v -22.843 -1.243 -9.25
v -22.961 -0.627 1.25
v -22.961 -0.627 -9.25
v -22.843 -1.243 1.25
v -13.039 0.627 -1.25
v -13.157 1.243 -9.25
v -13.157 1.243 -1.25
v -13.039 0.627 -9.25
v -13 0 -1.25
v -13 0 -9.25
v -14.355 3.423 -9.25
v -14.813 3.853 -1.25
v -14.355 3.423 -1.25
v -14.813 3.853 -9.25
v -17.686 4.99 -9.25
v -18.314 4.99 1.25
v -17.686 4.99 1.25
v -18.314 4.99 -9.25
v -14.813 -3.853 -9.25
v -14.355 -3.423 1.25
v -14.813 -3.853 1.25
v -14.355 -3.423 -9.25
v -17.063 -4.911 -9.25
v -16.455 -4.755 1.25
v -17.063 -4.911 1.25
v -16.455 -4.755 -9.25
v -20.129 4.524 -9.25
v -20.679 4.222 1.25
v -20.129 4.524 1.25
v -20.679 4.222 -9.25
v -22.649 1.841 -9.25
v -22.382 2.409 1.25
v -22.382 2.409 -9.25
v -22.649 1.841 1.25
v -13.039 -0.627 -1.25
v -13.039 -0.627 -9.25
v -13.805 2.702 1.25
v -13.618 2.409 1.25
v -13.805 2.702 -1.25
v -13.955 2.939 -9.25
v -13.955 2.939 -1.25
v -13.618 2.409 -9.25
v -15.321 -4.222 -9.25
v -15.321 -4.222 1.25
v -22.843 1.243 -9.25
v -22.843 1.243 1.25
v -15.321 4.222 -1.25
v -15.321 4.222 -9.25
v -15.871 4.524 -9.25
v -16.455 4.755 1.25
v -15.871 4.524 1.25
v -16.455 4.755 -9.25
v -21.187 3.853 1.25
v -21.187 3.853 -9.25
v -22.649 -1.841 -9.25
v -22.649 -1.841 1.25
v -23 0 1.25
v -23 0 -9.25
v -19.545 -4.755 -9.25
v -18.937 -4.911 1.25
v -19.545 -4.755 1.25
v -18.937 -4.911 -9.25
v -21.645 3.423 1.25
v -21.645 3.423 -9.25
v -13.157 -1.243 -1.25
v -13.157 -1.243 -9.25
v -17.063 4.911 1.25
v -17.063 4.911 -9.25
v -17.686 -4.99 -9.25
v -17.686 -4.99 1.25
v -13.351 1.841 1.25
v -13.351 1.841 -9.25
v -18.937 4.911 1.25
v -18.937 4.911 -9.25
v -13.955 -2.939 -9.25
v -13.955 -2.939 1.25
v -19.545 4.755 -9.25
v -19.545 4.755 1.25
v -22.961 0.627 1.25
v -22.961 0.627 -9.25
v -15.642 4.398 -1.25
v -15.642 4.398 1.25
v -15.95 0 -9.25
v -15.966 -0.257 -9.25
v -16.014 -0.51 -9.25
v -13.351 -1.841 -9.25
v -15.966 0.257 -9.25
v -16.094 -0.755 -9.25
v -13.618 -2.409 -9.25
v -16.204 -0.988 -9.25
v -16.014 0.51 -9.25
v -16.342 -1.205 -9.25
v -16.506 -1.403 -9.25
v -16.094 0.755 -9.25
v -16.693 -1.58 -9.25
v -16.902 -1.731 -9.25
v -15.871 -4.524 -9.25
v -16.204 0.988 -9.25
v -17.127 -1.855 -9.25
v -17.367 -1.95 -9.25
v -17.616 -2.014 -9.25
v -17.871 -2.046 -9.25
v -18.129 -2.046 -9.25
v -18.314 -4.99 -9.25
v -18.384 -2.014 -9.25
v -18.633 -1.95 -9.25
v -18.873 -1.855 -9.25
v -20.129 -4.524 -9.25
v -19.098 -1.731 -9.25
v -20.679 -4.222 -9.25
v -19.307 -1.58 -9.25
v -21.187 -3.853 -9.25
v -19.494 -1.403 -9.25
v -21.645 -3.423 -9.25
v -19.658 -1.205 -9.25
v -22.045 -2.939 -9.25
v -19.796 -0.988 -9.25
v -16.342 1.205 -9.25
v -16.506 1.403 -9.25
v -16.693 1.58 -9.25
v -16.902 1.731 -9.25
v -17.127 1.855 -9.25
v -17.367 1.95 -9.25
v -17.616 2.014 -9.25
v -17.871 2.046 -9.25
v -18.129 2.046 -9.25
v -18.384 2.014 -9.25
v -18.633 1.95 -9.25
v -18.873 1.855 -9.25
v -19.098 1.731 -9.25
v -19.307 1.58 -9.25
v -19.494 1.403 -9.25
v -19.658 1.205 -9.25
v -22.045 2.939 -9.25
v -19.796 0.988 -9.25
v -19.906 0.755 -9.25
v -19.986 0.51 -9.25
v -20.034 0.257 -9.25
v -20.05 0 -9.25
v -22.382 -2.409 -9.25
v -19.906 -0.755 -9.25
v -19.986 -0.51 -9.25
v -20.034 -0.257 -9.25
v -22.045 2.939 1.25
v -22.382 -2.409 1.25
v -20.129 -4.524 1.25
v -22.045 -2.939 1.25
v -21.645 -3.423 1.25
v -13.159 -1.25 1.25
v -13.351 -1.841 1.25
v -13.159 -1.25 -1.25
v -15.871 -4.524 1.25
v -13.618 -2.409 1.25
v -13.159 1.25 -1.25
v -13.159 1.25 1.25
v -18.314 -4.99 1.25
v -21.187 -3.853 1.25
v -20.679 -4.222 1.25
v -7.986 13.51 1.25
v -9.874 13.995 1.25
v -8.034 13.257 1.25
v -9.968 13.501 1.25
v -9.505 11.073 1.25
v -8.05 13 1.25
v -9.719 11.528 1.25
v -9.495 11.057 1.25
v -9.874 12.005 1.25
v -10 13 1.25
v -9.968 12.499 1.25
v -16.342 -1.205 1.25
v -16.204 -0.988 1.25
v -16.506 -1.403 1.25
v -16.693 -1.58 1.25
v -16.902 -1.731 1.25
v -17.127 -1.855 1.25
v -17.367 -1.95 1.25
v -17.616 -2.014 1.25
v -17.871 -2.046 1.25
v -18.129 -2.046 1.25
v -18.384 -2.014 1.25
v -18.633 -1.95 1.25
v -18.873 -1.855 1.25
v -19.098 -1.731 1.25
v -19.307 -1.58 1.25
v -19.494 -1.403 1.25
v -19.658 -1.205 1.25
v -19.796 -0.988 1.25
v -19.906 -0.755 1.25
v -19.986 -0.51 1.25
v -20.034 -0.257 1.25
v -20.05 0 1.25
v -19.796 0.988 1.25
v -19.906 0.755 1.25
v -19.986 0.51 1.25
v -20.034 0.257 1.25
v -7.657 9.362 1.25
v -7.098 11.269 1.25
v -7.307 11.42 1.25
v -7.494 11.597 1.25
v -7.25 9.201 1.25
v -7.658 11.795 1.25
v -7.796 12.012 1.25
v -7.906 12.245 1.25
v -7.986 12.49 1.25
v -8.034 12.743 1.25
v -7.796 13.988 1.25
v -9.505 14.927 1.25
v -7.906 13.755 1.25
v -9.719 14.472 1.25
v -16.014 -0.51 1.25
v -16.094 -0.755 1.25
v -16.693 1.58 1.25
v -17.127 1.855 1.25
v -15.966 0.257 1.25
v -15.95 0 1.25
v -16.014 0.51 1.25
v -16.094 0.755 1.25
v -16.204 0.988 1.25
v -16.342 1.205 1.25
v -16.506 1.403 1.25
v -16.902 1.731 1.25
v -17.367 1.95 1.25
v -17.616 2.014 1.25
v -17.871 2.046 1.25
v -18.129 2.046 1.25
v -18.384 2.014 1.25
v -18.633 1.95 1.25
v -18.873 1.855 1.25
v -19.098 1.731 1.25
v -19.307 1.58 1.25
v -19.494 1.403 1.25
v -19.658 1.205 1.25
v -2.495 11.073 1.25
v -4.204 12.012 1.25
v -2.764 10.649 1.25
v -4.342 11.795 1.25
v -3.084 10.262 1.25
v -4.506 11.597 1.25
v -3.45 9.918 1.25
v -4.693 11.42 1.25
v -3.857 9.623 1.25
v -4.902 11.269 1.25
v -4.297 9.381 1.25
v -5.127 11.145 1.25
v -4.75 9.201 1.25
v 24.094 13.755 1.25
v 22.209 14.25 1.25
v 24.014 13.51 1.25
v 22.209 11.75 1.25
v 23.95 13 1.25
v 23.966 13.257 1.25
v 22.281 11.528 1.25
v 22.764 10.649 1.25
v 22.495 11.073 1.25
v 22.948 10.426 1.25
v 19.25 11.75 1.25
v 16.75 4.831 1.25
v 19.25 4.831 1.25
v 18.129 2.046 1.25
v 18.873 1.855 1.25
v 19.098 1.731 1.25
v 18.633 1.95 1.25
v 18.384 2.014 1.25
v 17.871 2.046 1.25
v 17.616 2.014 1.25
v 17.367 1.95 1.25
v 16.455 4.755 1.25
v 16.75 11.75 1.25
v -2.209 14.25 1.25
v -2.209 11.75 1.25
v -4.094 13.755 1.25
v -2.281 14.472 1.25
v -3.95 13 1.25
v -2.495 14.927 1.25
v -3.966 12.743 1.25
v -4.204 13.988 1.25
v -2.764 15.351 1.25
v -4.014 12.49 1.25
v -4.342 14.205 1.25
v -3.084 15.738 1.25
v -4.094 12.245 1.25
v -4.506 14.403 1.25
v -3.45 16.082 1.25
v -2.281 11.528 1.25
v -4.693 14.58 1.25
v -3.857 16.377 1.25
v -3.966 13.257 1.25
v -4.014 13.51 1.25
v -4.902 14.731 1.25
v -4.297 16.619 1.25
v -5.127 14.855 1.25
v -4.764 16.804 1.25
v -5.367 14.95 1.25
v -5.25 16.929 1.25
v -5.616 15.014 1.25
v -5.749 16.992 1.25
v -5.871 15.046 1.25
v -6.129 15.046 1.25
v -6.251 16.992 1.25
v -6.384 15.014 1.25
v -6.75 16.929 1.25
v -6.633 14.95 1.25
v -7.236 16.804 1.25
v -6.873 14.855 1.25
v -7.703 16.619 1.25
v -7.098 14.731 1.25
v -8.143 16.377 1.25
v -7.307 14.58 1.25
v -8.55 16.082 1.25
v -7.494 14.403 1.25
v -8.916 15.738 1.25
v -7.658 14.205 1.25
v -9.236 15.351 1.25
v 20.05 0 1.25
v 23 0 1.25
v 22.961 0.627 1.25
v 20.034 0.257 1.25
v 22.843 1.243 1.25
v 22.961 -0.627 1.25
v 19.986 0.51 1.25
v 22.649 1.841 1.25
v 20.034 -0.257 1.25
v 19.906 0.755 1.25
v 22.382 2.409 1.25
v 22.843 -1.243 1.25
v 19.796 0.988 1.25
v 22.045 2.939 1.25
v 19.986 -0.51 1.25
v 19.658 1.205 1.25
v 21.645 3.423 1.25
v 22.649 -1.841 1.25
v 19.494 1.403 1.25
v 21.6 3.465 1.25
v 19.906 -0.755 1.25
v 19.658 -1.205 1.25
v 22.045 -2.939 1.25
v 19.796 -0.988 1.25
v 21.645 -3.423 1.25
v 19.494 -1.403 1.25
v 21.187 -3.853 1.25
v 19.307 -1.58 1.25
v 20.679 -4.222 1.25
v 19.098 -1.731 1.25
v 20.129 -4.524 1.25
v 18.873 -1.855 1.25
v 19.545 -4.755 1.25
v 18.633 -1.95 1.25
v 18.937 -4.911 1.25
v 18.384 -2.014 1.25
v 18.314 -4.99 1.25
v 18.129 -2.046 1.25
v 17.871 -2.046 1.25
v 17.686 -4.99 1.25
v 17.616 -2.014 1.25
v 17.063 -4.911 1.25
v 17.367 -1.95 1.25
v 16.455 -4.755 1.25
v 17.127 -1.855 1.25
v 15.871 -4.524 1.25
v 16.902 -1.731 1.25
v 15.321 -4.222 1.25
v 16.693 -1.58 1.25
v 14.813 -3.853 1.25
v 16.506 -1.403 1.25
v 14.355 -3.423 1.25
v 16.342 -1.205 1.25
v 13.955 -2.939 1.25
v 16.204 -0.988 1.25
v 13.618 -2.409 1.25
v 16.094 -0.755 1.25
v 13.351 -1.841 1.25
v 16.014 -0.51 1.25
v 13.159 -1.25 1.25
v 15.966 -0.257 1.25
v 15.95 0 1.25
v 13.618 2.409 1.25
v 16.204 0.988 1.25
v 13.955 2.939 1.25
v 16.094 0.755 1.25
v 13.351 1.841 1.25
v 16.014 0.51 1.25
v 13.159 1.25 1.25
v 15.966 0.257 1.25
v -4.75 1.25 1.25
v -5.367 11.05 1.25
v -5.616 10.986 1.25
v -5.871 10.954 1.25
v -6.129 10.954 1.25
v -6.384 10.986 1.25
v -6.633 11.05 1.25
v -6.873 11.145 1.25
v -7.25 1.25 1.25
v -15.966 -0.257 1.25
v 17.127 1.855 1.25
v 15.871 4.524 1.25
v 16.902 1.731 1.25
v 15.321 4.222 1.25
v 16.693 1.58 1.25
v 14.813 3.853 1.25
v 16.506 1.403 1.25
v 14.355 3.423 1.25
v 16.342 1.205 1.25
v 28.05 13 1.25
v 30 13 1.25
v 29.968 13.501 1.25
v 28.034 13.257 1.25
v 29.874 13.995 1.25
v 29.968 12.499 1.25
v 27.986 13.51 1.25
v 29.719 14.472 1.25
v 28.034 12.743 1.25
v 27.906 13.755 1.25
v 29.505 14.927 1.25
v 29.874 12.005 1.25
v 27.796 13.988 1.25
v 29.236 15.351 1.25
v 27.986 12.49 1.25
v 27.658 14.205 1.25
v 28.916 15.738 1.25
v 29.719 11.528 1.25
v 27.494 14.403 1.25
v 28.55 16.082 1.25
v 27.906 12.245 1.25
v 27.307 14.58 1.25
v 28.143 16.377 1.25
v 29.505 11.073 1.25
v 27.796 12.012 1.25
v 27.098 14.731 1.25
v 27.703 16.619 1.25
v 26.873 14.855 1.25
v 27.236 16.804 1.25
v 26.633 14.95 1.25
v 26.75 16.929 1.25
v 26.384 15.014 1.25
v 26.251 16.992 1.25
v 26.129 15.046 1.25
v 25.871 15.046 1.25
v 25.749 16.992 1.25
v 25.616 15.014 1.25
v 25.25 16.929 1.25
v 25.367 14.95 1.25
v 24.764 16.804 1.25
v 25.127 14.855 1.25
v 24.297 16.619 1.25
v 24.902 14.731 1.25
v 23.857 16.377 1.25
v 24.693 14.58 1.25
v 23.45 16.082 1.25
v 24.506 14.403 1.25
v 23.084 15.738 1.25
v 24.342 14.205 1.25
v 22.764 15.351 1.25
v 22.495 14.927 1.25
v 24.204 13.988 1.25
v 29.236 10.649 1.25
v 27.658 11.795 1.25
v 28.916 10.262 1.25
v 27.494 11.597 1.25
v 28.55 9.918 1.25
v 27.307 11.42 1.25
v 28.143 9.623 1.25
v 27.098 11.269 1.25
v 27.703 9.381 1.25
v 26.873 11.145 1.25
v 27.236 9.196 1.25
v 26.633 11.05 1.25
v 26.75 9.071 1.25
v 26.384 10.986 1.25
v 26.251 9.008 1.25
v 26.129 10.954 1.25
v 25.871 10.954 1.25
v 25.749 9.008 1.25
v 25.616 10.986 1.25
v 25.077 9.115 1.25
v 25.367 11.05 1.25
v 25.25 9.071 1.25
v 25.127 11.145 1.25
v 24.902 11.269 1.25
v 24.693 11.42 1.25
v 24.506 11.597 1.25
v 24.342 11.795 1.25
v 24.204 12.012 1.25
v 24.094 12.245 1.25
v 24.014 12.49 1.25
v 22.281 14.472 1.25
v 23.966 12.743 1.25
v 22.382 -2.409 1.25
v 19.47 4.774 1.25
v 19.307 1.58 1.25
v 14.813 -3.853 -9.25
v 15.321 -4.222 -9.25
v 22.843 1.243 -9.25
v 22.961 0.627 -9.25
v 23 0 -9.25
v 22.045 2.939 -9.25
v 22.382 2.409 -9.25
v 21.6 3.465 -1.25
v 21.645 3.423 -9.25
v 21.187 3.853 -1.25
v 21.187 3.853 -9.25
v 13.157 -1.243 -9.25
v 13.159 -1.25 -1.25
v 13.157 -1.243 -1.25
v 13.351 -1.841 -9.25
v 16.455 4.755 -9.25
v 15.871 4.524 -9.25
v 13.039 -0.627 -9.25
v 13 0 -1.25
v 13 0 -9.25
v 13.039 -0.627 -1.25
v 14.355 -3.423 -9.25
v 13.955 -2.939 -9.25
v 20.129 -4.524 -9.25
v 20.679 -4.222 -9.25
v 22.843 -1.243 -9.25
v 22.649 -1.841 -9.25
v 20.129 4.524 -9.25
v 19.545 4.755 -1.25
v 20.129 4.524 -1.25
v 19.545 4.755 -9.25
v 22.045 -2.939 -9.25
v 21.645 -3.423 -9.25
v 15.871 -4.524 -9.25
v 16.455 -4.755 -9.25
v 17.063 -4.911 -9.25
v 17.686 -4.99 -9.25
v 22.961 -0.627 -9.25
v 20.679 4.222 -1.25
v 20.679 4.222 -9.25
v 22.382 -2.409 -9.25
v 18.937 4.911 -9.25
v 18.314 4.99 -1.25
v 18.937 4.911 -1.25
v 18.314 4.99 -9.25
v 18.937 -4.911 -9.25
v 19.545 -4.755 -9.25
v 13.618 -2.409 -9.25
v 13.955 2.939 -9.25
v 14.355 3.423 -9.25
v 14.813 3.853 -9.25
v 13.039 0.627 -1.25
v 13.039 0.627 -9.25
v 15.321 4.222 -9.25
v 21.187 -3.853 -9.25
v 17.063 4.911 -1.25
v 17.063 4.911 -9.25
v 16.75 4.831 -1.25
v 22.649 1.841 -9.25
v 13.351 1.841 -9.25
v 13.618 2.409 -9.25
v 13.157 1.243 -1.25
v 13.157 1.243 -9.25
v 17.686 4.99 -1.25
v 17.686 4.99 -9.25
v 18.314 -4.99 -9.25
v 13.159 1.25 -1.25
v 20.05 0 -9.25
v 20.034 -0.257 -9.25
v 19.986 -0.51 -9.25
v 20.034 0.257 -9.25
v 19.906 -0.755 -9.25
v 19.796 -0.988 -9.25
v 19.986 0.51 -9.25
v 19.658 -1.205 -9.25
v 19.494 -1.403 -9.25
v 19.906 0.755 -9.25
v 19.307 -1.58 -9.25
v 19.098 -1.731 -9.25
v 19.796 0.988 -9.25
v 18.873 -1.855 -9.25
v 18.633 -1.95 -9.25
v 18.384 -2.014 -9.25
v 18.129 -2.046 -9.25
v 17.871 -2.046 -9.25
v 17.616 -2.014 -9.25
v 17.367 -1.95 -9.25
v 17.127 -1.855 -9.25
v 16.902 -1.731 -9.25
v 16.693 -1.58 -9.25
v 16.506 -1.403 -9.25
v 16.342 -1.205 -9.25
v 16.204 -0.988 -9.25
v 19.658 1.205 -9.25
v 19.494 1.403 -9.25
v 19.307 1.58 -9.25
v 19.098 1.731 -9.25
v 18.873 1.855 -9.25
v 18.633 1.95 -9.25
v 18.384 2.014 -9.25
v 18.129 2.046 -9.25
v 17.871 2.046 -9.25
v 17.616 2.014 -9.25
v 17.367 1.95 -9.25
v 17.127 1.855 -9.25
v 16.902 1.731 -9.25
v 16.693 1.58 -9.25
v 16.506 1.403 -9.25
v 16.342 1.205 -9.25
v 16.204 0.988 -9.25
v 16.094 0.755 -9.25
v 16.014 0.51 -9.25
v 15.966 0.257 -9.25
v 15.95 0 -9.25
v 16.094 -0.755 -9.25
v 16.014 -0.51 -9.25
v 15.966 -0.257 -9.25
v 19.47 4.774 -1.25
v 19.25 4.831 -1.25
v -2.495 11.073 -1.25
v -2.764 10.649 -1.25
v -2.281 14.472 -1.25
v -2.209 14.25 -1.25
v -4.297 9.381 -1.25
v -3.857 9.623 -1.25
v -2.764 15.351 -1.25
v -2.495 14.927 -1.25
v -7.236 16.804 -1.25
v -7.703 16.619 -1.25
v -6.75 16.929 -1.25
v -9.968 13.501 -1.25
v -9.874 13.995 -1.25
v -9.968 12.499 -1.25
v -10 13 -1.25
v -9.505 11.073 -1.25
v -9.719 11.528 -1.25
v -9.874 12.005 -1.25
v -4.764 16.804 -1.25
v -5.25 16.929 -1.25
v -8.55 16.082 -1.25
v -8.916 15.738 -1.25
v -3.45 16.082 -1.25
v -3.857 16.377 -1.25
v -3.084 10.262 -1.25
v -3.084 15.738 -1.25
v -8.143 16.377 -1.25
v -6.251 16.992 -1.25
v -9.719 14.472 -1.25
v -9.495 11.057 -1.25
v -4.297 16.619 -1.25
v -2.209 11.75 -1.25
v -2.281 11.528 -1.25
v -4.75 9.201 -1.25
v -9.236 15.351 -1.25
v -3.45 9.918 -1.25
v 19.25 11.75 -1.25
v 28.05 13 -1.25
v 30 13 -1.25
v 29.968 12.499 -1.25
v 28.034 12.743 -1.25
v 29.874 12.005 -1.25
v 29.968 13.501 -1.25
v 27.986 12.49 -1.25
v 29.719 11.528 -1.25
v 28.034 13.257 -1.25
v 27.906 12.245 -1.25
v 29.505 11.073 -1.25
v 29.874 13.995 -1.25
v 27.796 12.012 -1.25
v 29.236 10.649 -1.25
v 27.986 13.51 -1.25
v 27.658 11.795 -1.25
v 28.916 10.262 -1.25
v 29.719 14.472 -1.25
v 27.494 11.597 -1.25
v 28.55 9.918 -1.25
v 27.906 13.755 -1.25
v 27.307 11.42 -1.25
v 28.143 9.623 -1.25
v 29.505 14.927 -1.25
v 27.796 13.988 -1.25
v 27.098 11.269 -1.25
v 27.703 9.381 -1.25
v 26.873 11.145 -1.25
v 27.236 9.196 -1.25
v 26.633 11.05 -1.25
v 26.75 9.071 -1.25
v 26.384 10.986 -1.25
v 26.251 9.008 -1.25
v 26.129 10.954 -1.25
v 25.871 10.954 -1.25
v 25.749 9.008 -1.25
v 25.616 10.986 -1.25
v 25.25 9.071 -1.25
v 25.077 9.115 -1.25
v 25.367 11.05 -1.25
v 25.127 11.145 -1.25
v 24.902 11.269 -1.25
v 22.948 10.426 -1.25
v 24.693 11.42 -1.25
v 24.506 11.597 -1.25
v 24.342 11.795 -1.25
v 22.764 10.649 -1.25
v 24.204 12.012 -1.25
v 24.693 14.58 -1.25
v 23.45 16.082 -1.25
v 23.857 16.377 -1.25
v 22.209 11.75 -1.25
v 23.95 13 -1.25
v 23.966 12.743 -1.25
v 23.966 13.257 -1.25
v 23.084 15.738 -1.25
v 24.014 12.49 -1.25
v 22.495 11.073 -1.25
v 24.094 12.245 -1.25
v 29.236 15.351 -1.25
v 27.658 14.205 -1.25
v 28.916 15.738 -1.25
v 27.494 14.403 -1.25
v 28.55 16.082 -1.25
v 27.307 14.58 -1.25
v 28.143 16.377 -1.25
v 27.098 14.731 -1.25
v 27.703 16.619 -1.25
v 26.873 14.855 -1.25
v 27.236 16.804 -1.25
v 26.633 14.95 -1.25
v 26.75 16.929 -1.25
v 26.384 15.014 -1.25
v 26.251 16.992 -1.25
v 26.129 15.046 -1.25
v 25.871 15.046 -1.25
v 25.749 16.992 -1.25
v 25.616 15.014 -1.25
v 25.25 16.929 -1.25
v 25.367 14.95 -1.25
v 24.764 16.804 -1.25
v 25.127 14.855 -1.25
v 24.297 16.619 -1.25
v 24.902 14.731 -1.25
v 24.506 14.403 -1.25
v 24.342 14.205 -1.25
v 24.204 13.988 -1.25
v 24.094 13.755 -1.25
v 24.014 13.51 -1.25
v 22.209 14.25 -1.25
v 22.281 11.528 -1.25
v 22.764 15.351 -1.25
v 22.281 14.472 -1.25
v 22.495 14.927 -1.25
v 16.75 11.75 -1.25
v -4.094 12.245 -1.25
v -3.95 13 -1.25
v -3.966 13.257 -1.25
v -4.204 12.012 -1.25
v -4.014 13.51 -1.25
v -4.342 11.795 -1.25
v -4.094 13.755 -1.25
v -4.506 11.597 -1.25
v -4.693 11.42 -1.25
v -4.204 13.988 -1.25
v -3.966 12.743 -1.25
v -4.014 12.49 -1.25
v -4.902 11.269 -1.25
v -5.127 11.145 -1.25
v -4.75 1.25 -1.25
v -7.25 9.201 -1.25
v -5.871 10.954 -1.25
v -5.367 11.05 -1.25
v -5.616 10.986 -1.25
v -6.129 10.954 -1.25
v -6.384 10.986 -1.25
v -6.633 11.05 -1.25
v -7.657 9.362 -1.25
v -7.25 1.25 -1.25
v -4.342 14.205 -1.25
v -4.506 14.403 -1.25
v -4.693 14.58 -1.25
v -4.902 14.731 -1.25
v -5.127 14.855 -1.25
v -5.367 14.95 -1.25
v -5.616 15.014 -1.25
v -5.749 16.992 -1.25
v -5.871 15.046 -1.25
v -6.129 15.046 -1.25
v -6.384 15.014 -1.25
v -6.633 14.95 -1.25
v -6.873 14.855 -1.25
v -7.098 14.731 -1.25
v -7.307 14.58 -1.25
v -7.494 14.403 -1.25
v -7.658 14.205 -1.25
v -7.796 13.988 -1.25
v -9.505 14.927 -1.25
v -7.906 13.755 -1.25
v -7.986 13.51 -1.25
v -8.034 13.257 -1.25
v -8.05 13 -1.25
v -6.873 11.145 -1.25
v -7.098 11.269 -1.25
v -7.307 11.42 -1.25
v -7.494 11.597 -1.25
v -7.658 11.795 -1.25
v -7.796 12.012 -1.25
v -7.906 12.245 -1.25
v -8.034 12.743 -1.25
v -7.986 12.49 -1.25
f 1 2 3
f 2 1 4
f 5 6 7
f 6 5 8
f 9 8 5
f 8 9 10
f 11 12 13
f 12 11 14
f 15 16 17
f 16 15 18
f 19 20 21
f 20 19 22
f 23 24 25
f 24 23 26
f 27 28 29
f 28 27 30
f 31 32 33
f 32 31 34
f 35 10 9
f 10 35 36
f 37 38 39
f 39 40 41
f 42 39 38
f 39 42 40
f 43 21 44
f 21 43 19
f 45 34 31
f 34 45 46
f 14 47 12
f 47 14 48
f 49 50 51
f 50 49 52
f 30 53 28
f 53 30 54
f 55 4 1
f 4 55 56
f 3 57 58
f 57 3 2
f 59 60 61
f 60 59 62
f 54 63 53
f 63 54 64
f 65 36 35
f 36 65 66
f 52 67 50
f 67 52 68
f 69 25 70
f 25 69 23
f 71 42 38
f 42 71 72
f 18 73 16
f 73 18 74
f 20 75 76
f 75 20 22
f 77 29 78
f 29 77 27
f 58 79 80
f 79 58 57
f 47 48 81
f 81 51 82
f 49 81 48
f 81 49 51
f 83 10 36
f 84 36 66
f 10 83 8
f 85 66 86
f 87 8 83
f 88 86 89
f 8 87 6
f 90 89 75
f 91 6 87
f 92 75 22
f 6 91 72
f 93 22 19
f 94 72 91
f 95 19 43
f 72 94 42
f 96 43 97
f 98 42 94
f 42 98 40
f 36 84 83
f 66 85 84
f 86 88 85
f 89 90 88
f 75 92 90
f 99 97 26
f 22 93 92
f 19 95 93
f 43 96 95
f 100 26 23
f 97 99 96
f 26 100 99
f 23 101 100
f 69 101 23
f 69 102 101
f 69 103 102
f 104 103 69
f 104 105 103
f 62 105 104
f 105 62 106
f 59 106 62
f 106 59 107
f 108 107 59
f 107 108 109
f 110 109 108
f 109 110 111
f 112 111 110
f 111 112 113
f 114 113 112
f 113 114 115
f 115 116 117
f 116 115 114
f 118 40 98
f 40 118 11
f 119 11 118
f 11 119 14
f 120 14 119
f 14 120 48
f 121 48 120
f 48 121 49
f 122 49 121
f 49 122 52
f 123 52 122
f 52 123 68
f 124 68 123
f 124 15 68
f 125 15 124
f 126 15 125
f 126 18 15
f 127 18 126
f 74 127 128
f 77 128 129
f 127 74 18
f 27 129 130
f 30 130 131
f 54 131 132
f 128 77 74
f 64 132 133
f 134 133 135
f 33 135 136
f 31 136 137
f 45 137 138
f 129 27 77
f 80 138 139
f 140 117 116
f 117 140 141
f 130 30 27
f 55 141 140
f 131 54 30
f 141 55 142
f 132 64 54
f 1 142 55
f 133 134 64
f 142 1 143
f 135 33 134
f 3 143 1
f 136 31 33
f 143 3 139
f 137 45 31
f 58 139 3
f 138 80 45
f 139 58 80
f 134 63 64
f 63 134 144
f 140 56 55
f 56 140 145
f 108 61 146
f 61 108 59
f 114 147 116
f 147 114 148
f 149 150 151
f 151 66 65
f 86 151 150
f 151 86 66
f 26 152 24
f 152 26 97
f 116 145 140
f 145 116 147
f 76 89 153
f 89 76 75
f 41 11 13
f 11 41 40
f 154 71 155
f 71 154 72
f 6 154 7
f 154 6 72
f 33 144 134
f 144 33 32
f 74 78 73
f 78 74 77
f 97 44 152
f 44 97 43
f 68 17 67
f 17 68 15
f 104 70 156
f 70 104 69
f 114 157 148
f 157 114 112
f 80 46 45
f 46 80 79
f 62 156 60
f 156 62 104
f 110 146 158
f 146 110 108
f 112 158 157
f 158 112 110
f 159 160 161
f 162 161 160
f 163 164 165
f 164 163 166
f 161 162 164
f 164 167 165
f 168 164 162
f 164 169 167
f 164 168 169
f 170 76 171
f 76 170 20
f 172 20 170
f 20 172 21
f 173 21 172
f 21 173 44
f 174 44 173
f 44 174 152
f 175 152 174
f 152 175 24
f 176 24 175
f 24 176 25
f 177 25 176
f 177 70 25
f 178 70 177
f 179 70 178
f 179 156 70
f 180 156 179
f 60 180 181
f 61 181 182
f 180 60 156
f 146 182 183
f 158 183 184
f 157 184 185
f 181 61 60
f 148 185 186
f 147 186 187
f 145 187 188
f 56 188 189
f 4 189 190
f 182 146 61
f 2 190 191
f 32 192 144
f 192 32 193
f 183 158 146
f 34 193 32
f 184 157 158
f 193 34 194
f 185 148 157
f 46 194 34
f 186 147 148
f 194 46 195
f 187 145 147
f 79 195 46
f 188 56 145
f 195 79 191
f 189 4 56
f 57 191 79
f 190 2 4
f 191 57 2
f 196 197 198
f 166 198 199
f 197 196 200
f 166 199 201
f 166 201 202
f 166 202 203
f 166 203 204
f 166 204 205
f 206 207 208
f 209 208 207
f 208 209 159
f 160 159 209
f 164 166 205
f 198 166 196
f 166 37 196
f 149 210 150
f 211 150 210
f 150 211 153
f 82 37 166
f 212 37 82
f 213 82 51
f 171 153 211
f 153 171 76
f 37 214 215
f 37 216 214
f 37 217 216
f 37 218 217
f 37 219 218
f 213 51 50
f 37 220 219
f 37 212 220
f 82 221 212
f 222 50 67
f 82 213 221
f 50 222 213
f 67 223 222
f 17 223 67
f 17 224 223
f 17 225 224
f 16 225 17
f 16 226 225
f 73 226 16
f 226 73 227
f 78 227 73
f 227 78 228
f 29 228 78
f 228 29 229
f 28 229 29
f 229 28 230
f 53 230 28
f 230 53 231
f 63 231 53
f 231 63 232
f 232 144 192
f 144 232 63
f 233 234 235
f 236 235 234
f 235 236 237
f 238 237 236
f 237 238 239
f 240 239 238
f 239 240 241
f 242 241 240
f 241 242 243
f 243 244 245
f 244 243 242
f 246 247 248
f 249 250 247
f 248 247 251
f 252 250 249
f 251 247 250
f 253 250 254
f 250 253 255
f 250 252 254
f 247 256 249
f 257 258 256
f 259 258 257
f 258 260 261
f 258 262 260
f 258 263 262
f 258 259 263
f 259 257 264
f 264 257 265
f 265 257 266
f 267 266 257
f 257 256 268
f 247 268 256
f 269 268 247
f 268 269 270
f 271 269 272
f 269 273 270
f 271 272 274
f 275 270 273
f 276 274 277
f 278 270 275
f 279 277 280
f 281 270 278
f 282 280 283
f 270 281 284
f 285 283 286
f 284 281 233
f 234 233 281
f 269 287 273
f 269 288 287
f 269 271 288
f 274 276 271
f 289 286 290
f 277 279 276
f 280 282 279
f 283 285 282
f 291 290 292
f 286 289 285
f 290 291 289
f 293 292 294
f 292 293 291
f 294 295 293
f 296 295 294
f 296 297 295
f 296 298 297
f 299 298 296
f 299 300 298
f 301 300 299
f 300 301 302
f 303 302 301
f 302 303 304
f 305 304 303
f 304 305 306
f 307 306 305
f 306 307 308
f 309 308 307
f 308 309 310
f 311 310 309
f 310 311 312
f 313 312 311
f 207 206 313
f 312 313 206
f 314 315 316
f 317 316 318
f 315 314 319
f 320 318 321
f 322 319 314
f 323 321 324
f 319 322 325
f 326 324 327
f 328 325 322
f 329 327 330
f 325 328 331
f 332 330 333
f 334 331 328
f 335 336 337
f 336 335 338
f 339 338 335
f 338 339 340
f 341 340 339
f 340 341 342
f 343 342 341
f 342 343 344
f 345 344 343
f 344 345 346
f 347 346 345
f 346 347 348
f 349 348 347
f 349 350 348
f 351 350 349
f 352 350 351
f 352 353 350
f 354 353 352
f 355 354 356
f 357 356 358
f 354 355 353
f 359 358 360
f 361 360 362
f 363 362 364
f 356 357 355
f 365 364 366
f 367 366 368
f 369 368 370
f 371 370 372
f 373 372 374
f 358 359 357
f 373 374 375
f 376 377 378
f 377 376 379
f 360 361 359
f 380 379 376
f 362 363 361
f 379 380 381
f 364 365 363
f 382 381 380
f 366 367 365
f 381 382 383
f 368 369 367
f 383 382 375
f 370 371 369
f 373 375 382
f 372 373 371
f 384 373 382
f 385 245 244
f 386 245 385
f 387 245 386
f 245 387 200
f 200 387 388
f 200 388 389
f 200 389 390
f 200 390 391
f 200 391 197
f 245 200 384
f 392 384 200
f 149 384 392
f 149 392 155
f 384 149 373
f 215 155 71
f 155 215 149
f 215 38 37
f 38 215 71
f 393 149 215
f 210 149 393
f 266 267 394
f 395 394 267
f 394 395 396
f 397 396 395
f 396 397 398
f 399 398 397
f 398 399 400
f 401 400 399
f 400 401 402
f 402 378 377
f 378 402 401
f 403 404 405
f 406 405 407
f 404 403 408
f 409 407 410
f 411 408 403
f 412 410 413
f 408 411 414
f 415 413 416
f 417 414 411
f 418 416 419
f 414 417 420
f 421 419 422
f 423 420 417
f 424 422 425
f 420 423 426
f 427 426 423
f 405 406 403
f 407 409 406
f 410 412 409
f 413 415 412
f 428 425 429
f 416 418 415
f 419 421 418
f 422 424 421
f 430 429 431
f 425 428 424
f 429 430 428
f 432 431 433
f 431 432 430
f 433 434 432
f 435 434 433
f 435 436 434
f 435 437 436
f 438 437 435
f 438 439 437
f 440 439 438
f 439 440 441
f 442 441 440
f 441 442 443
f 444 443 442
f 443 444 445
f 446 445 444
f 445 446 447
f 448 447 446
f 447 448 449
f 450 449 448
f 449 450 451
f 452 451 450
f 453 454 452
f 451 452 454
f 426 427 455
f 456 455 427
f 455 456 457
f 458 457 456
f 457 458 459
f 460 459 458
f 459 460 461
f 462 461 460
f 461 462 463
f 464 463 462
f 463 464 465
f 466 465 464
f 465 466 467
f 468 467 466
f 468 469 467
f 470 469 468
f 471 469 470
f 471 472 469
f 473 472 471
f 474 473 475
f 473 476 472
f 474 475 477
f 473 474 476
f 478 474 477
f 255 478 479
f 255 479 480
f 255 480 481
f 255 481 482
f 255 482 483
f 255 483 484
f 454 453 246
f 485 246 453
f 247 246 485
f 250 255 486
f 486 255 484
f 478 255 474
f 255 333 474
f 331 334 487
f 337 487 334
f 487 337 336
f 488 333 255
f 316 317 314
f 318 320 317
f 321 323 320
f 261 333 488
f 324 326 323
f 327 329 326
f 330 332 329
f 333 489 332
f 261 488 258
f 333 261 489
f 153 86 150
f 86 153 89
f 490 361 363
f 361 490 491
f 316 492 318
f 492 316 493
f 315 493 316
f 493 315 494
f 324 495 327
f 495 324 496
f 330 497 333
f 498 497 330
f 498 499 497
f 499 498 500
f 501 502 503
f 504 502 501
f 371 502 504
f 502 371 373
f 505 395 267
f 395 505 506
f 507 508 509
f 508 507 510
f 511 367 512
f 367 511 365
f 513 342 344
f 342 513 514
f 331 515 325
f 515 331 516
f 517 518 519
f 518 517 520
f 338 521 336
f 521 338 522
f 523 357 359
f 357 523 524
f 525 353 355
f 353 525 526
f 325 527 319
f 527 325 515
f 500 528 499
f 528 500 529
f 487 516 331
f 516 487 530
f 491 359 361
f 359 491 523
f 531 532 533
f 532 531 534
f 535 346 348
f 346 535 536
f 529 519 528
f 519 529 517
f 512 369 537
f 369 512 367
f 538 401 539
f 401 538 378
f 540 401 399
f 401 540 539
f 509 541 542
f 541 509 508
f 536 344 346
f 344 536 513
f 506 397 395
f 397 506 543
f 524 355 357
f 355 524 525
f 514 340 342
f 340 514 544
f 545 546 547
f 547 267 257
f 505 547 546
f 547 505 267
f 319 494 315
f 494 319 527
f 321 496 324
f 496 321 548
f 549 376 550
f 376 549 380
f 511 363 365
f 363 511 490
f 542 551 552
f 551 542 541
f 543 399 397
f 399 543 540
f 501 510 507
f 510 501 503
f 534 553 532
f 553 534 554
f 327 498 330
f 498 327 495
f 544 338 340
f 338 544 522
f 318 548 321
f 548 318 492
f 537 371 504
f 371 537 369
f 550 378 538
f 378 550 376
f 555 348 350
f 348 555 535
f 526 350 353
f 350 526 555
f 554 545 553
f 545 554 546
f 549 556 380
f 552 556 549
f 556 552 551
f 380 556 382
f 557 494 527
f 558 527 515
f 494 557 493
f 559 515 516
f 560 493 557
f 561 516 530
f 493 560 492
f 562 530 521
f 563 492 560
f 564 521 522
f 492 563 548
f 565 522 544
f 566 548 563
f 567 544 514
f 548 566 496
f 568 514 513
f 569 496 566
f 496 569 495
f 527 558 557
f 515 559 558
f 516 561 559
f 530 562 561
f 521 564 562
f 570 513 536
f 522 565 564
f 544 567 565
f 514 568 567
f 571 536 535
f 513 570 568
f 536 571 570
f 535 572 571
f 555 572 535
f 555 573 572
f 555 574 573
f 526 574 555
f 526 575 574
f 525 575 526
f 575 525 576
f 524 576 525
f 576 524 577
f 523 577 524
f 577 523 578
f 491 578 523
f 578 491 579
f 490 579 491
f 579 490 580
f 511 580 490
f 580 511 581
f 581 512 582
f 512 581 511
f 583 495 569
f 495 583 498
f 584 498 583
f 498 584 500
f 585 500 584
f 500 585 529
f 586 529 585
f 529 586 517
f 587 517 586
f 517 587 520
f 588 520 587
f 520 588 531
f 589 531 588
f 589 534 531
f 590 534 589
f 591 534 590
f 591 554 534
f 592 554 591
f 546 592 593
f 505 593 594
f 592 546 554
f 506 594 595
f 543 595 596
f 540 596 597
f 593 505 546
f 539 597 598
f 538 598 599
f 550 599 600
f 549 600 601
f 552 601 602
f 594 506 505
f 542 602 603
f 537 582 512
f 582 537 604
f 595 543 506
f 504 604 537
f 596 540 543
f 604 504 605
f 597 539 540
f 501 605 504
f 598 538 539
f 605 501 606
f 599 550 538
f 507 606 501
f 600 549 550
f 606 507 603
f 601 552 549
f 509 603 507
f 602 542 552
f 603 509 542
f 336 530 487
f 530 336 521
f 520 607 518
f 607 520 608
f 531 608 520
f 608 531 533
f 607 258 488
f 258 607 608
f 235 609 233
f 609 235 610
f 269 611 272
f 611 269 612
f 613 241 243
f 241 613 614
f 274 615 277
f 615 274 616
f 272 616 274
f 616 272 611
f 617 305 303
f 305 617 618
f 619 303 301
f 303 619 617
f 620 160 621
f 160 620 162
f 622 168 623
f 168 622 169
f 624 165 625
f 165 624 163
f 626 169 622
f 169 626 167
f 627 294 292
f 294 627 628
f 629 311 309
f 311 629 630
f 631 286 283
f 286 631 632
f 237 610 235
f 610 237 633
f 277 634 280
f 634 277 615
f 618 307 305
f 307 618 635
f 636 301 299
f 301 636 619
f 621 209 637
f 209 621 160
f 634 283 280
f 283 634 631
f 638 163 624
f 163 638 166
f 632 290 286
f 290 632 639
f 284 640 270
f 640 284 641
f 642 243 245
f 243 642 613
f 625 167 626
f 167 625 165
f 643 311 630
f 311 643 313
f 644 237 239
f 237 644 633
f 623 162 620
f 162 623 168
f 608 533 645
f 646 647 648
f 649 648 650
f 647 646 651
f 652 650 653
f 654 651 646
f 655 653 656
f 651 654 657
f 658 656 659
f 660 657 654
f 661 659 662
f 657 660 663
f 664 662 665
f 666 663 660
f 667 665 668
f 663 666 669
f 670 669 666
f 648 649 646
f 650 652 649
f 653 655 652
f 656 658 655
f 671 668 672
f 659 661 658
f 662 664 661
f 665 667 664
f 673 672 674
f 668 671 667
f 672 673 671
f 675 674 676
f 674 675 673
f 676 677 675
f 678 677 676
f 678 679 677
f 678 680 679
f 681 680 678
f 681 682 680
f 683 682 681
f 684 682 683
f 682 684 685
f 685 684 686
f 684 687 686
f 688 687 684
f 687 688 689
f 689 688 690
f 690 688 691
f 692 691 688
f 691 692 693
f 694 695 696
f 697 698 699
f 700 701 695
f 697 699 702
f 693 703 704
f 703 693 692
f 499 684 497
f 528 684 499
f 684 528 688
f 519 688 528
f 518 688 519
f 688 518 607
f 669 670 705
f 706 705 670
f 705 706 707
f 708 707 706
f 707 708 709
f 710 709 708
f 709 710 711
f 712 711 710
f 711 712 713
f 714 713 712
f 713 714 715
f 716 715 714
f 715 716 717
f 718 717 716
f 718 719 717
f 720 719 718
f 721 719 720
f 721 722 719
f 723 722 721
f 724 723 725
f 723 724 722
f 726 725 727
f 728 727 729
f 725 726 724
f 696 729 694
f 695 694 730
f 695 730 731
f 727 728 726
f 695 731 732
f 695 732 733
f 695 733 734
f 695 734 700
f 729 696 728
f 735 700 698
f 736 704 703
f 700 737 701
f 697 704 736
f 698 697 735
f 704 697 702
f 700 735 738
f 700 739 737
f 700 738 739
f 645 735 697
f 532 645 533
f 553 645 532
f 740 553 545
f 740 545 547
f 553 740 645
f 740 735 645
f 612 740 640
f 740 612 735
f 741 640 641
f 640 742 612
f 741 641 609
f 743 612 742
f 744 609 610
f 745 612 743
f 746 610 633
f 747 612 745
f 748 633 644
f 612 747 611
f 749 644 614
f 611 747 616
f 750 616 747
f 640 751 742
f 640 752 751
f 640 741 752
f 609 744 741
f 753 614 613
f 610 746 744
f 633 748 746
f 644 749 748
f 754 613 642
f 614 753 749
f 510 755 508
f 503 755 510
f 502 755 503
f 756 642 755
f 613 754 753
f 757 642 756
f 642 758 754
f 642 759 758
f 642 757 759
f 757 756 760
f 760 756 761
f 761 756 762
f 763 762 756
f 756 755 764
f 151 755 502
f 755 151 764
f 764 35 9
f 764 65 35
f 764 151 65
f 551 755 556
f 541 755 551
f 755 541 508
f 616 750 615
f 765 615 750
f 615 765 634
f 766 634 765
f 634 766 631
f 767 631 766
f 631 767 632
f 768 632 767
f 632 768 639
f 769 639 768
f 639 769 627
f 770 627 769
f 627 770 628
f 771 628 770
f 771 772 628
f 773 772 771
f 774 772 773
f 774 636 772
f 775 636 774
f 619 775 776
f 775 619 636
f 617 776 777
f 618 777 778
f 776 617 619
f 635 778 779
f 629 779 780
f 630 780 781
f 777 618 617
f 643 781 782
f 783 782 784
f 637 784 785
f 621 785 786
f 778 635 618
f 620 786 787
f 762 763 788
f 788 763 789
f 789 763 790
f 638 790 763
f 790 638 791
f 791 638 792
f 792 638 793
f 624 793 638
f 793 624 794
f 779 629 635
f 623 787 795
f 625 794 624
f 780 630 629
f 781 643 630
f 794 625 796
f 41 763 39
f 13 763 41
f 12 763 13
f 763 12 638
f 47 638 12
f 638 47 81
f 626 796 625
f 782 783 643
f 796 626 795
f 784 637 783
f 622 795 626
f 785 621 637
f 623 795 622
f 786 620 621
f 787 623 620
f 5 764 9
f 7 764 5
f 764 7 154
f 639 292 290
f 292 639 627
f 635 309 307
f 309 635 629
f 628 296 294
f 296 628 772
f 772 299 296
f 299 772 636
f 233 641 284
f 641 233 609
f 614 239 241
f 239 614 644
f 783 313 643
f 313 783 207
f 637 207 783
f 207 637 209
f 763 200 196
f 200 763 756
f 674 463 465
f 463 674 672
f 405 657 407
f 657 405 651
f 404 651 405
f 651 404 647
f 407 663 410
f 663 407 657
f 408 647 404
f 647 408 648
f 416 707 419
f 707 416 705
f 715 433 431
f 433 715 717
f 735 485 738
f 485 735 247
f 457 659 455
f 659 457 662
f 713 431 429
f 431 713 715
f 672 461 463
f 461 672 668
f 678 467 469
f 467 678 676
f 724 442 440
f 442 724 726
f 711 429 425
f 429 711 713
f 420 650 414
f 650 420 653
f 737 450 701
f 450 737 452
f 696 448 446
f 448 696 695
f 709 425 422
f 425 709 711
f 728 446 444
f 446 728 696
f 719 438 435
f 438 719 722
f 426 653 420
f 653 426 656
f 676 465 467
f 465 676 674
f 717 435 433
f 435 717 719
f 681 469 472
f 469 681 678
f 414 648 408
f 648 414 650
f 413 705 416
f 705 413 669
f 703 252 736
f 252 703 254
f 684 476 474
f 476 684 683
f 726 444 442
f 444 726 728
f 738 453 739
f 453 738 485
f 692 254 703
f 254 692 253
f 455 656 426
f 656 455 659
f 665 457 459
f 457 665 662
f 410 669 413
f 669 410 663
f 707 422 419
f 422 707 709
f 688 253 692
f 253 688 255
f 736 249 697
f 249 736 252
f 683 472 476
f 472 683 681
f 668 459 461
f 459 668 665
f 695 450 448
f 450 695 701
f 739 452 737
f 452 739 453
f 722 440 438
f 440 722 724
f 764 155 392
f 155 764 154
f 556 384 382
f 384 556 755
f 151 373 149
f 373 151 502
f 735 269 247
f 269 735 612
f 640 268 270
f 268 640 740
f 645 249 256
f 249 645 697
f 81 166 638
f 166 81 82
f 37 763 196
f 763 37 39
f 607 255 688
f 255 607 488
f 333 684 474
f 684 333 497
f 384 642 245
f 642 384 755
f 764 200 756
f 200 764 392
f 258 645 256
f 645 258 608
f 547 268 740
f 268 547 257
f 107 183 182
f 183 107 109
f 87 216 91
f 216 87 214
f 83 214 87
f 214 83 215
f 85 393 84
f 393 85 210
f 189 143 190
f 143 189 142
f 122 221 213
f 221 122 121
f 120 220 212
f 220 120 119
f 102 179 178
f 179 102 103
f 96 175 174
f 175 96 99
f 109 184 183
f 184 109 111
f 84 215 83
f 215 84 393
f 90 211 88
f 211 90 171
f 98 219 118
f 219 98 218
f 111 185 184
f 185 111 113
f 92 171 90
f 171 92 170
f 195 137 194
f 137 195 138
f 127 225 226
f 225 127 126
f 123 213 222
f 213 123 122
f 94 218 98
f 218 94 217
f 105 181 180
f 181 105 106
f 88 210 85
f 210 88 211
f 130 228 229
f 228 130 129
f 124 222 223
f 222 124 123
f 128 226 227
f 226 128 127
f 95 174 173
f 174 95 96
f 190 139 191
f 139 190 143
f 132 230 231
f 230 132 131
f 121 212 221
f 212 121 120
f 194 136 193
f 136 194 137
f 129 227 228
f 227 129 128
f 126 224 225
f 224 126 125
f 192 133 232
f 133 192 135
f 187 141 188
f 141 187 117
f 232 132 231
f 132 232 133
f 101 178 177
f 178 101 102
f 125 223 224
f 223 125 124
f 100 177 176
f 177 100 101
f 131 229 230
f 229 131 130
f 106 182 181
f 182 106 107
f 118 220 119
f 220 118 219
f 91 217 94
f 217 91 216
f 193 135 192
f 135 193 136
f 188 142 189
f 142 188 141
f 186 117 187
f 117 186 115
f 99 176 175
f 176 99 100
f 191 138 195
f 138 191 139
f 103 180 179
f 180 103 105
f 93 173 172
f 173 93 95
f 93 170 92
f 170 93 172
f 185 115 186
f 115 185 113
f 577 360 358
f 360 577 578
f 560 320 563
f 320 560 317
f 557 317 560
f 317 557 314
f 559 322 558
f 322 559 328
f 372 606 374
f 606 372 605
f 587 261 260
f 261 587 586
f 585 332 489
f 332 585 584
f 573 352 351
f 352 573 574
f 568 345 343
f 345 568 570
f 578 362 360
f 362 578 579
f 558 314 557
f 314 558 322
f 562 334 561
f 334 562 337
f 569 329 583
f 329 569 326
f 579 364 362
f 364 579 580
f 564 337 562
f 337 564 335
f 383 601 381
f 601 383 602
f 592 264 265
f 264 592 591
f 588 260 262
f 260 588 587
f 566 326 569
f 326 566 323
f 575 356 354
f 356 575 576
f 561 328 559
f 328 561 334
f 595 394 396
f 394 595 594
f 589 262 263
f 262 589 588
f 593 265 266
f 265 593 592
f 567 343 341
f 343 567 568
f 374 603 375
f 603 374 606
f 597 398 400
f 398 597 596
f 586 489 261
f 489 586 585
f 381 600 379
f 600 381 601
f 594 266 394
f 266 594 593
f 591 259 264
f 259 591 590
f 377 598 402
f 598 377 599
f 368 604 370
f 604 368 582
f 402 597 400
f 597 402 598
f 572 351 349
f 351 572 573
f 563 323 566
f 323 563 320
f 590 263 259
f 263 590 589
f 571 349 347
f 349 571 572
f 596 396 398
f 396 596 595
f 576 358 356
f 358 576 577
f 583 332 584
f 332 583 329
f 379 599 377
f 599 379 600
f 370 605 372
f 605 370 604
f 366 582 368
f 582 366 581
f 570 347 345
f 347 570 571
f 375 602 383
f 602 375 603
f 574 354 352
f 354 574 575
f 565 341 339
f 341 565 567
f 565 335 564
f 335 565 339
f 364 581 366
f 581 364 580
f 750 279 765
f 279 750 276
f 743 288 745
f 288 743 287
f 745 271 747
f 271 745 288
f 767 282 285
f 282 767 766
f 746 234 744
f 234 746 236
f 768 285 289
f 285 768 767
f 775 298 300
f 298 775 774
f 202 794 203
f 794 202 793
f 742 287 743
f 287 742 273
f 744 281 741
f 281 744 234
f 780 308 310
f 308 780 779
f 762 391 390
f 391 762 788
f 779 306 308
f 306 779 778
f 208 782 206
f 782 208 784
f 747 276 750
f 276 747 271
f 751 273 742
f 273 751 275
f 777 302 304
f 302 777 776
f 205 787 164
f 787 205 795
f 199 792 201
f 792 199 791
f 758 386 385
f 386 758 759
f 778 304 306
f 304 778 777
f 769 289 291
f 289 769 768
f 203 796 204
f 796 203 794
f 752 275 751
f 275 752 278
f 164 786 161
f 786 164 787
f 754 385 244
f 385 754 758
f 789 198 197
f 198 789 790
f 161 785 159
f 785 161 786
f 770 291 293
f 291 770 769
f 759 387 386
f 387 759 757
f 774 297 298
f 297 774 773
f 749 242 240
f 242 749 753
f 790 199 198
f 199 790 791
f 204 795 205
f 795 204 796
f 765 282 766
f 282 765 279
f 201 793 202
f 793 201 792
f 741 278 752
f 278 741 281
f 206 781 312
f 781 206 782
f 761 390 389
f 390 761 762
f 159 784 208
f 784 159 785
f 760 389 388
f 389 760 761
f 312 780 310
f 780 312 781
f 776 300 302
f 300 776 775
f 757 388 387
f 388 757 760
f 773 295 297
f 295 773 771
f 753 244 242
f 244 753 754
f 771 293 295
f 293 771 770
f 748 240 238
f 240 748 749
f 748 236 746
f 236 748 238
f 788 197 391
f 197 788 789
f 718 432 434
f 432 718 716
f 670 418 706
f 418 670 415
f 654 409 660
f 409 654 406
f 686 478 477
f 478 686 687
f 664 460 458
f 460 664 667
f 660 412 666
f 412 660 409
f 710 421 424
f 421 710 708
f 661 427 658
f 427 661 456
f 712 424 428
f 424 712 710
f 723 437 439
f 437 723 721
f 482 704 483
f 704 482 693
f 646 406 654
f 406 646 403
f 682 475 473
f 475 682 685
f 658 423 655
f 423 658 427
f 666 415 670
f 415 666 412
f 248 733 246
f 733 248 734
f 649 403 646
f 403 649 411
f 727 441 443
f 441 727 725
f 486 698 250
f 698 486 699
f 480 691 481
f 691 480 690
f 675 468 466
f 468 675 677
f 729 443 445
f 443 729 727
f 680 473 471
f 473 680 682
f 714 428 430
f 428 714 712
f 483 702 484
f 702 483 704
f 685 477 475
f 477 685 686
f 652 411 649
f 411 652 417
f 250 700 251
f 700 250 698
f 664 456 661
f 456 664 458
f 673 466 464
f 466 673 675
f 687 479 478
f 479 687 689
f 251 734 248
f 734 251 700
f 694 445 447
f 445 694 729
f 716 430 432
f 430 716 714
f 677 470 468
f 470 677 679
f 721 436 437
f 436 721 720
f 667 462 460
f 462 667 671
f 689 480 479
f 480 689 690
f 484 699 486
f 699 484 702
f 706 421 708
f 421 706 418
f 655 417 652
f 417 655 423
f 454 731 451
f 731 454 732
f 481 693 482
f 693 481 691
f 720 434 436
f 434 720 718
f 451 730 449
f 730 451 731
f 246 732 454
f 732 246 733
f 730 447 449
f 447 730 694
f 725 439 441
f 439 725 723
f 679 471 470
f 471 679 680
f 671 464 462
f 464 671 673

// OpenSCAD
// fan mount
//  - this goes at the end where there were camera mounts
// 
// TODO
// - m4_major snug @ 4.1, but acceptable
// - the offset is wrong
//   - was 20 mm
//   - probably more like 10-15
// - make the base face taller (i.e. as if there ere 4 mm of washers)

base_cl = 36.0;      // distance between the holes on the base
base_height = 13.00; // post height: 10 + rail height: 3
base_mnt_hght = 8.0; // the base holes are 8mm from bottom
base_spacer = 8.0;   // add spacer to provide clearance from jetson edge
// Noctua NF-A4x10 5V PWM
//      40x10mm Premium Fan
// https://noctua.at/en/nf-a4x10-flx/specification
fan_cl = 32.0;       // centerline distance between fan holes
fan_abv_jet = 8.0;   // fan needs to be above the floor of jetson 
                     // for screw heads to clear
fan_offset = 10;     // 80/2 - 20 = 20
                     // heatsink is not on center, it's 20mm offset from jetson CL
m4_major_dia = 4.1;  // major + clearance
fan_mnt_face = 8.0;  // mounting face on fan
base_mnt_face = 10.0;// mounting face at base to match jetson base

plate_z = 2.5;       // mounting plate thickness

// support bars
bar_x = 2.5;
bar_y = 2.5;
bar_z = plate_z;

// fan mount height
mnt_height = fan_abv_jet + base_height - base_mnt_hght;

$fn = 50;

difference () {
    union () {
        
        // ----- base mounts ------
        translate([-base_cl/2,0, -((base_spacer/2 + plate_z) - plate_z)])
        cylinder(r=base_mnt_face/2, h=plate_z + base_spacer, center=true);
        translate([+base_cl/2,0, -((base_spacer/2 + plate_z) - plate_z)])
        cylinder(r=base_mnt_face/2, h=plate_z + base_spacer, center=true);
        
        // ---- fan mounts ------
        
        // translate X
        // - fan offset + the difference in the CenterLines/2

        translate([- fan_cl/2 + fan_offset, mnt_height, 0])
        cylinder(r=fan_mnt_face/2, h=plate_z, center=true);
        translate([+ fan_cl/2 + fan_offset, mnt_height, 0])
        cylinder(r=fan_mnt_face/2, h=plate_z, center=true);
        
        // cross bars
        translate([0,0,0])
        cube([base_cl, bar_y, bar_z], center = true);
        
        translate([fan_offset, mnt_height,0])
        cube([fan_cl, bar_y, bar_z], center = true);
        
        // hypteneuse LEFT
        
        adj_left  = (- fan_cl/2 + fan_offset) - (-base_cl/2);
        adj_rght =  (+ fan_cl/2 + fan_offset) - (base_cl/2);
        echo ("left adjacent: ", adj_left, "  right adjacent: ", adj_rght);
        
        mnt_angle_left = atan(mnt_height/adj_left);
        sin_angle_left = sin(mnt_angle_left);
        echo ("left mount angle:", mnt_angle_left, "  sin:", sin_angle_left);
        hyp_left = mnt_height/sin_angle_left;
        
        translate([
            -base_cl/2 + adj_left/2,
            mnt_height/2,
            0]) 
        rotate([0,0,mnt_angle_left])
        cube([hyp_left, bar_y, bar_z], center=true);
        
        // hypteneuse RIGHT
        mnt_angle_rght = atan(mnt_height/adj_rght);
        sin_angle_rght = sin(mnt_angle_rght);
        echo ("right mount angle:", mnt_angle_rght, "  sin:", sin_angle_rght);
        hyp_rght = mnt_height/sin_angle_rght;

        translate([
            base_cl/2 + adj_rght/2,
            mnt_height/2,
            0]) 
        rotate([0,0,mnt_angle_rght])
        cube([hyp_rght, bar_y, bar_z], center=true);
        
        // veritical supports
        translate([- fan_cl/2 + fan_offset,mnt_height/2,0])
        cube([bar_x, mnt_height, bar_z], center=true);
        
        translate([+base_cl/2,mnt_height/2,0])
        cube([bar_x, mnt_height, bar_z], center=true);
    }
    {
    // drill holes
        // ----- base mounts ------
        translate([-base_cl/2,0, -((base_spacer/2 + plate_z) - plate_z)])
        cylinder(r=m4_major_dia/2, h=plate_z + base_spacer, center=true);
        translate([+base_cl/2,0, -((base_spacer/2 + plate_z) - plate_z)])
        cylinder(r=m4_major_dia/2, h=plate_z + base_spacer, center=true);    
        
        // fan mounts
        translate([- fan_cl/2 + fan_offset, mnt_height, 0])
        cylinder(r=m4_major_dia/2, h=plate_z, center=true);
        translate([+ fan_cl/2 + fan_offset, mnt_height, 0])
        cylinder(r=m4_major_dia/2, h=plate_z, center=true);
    }
}
